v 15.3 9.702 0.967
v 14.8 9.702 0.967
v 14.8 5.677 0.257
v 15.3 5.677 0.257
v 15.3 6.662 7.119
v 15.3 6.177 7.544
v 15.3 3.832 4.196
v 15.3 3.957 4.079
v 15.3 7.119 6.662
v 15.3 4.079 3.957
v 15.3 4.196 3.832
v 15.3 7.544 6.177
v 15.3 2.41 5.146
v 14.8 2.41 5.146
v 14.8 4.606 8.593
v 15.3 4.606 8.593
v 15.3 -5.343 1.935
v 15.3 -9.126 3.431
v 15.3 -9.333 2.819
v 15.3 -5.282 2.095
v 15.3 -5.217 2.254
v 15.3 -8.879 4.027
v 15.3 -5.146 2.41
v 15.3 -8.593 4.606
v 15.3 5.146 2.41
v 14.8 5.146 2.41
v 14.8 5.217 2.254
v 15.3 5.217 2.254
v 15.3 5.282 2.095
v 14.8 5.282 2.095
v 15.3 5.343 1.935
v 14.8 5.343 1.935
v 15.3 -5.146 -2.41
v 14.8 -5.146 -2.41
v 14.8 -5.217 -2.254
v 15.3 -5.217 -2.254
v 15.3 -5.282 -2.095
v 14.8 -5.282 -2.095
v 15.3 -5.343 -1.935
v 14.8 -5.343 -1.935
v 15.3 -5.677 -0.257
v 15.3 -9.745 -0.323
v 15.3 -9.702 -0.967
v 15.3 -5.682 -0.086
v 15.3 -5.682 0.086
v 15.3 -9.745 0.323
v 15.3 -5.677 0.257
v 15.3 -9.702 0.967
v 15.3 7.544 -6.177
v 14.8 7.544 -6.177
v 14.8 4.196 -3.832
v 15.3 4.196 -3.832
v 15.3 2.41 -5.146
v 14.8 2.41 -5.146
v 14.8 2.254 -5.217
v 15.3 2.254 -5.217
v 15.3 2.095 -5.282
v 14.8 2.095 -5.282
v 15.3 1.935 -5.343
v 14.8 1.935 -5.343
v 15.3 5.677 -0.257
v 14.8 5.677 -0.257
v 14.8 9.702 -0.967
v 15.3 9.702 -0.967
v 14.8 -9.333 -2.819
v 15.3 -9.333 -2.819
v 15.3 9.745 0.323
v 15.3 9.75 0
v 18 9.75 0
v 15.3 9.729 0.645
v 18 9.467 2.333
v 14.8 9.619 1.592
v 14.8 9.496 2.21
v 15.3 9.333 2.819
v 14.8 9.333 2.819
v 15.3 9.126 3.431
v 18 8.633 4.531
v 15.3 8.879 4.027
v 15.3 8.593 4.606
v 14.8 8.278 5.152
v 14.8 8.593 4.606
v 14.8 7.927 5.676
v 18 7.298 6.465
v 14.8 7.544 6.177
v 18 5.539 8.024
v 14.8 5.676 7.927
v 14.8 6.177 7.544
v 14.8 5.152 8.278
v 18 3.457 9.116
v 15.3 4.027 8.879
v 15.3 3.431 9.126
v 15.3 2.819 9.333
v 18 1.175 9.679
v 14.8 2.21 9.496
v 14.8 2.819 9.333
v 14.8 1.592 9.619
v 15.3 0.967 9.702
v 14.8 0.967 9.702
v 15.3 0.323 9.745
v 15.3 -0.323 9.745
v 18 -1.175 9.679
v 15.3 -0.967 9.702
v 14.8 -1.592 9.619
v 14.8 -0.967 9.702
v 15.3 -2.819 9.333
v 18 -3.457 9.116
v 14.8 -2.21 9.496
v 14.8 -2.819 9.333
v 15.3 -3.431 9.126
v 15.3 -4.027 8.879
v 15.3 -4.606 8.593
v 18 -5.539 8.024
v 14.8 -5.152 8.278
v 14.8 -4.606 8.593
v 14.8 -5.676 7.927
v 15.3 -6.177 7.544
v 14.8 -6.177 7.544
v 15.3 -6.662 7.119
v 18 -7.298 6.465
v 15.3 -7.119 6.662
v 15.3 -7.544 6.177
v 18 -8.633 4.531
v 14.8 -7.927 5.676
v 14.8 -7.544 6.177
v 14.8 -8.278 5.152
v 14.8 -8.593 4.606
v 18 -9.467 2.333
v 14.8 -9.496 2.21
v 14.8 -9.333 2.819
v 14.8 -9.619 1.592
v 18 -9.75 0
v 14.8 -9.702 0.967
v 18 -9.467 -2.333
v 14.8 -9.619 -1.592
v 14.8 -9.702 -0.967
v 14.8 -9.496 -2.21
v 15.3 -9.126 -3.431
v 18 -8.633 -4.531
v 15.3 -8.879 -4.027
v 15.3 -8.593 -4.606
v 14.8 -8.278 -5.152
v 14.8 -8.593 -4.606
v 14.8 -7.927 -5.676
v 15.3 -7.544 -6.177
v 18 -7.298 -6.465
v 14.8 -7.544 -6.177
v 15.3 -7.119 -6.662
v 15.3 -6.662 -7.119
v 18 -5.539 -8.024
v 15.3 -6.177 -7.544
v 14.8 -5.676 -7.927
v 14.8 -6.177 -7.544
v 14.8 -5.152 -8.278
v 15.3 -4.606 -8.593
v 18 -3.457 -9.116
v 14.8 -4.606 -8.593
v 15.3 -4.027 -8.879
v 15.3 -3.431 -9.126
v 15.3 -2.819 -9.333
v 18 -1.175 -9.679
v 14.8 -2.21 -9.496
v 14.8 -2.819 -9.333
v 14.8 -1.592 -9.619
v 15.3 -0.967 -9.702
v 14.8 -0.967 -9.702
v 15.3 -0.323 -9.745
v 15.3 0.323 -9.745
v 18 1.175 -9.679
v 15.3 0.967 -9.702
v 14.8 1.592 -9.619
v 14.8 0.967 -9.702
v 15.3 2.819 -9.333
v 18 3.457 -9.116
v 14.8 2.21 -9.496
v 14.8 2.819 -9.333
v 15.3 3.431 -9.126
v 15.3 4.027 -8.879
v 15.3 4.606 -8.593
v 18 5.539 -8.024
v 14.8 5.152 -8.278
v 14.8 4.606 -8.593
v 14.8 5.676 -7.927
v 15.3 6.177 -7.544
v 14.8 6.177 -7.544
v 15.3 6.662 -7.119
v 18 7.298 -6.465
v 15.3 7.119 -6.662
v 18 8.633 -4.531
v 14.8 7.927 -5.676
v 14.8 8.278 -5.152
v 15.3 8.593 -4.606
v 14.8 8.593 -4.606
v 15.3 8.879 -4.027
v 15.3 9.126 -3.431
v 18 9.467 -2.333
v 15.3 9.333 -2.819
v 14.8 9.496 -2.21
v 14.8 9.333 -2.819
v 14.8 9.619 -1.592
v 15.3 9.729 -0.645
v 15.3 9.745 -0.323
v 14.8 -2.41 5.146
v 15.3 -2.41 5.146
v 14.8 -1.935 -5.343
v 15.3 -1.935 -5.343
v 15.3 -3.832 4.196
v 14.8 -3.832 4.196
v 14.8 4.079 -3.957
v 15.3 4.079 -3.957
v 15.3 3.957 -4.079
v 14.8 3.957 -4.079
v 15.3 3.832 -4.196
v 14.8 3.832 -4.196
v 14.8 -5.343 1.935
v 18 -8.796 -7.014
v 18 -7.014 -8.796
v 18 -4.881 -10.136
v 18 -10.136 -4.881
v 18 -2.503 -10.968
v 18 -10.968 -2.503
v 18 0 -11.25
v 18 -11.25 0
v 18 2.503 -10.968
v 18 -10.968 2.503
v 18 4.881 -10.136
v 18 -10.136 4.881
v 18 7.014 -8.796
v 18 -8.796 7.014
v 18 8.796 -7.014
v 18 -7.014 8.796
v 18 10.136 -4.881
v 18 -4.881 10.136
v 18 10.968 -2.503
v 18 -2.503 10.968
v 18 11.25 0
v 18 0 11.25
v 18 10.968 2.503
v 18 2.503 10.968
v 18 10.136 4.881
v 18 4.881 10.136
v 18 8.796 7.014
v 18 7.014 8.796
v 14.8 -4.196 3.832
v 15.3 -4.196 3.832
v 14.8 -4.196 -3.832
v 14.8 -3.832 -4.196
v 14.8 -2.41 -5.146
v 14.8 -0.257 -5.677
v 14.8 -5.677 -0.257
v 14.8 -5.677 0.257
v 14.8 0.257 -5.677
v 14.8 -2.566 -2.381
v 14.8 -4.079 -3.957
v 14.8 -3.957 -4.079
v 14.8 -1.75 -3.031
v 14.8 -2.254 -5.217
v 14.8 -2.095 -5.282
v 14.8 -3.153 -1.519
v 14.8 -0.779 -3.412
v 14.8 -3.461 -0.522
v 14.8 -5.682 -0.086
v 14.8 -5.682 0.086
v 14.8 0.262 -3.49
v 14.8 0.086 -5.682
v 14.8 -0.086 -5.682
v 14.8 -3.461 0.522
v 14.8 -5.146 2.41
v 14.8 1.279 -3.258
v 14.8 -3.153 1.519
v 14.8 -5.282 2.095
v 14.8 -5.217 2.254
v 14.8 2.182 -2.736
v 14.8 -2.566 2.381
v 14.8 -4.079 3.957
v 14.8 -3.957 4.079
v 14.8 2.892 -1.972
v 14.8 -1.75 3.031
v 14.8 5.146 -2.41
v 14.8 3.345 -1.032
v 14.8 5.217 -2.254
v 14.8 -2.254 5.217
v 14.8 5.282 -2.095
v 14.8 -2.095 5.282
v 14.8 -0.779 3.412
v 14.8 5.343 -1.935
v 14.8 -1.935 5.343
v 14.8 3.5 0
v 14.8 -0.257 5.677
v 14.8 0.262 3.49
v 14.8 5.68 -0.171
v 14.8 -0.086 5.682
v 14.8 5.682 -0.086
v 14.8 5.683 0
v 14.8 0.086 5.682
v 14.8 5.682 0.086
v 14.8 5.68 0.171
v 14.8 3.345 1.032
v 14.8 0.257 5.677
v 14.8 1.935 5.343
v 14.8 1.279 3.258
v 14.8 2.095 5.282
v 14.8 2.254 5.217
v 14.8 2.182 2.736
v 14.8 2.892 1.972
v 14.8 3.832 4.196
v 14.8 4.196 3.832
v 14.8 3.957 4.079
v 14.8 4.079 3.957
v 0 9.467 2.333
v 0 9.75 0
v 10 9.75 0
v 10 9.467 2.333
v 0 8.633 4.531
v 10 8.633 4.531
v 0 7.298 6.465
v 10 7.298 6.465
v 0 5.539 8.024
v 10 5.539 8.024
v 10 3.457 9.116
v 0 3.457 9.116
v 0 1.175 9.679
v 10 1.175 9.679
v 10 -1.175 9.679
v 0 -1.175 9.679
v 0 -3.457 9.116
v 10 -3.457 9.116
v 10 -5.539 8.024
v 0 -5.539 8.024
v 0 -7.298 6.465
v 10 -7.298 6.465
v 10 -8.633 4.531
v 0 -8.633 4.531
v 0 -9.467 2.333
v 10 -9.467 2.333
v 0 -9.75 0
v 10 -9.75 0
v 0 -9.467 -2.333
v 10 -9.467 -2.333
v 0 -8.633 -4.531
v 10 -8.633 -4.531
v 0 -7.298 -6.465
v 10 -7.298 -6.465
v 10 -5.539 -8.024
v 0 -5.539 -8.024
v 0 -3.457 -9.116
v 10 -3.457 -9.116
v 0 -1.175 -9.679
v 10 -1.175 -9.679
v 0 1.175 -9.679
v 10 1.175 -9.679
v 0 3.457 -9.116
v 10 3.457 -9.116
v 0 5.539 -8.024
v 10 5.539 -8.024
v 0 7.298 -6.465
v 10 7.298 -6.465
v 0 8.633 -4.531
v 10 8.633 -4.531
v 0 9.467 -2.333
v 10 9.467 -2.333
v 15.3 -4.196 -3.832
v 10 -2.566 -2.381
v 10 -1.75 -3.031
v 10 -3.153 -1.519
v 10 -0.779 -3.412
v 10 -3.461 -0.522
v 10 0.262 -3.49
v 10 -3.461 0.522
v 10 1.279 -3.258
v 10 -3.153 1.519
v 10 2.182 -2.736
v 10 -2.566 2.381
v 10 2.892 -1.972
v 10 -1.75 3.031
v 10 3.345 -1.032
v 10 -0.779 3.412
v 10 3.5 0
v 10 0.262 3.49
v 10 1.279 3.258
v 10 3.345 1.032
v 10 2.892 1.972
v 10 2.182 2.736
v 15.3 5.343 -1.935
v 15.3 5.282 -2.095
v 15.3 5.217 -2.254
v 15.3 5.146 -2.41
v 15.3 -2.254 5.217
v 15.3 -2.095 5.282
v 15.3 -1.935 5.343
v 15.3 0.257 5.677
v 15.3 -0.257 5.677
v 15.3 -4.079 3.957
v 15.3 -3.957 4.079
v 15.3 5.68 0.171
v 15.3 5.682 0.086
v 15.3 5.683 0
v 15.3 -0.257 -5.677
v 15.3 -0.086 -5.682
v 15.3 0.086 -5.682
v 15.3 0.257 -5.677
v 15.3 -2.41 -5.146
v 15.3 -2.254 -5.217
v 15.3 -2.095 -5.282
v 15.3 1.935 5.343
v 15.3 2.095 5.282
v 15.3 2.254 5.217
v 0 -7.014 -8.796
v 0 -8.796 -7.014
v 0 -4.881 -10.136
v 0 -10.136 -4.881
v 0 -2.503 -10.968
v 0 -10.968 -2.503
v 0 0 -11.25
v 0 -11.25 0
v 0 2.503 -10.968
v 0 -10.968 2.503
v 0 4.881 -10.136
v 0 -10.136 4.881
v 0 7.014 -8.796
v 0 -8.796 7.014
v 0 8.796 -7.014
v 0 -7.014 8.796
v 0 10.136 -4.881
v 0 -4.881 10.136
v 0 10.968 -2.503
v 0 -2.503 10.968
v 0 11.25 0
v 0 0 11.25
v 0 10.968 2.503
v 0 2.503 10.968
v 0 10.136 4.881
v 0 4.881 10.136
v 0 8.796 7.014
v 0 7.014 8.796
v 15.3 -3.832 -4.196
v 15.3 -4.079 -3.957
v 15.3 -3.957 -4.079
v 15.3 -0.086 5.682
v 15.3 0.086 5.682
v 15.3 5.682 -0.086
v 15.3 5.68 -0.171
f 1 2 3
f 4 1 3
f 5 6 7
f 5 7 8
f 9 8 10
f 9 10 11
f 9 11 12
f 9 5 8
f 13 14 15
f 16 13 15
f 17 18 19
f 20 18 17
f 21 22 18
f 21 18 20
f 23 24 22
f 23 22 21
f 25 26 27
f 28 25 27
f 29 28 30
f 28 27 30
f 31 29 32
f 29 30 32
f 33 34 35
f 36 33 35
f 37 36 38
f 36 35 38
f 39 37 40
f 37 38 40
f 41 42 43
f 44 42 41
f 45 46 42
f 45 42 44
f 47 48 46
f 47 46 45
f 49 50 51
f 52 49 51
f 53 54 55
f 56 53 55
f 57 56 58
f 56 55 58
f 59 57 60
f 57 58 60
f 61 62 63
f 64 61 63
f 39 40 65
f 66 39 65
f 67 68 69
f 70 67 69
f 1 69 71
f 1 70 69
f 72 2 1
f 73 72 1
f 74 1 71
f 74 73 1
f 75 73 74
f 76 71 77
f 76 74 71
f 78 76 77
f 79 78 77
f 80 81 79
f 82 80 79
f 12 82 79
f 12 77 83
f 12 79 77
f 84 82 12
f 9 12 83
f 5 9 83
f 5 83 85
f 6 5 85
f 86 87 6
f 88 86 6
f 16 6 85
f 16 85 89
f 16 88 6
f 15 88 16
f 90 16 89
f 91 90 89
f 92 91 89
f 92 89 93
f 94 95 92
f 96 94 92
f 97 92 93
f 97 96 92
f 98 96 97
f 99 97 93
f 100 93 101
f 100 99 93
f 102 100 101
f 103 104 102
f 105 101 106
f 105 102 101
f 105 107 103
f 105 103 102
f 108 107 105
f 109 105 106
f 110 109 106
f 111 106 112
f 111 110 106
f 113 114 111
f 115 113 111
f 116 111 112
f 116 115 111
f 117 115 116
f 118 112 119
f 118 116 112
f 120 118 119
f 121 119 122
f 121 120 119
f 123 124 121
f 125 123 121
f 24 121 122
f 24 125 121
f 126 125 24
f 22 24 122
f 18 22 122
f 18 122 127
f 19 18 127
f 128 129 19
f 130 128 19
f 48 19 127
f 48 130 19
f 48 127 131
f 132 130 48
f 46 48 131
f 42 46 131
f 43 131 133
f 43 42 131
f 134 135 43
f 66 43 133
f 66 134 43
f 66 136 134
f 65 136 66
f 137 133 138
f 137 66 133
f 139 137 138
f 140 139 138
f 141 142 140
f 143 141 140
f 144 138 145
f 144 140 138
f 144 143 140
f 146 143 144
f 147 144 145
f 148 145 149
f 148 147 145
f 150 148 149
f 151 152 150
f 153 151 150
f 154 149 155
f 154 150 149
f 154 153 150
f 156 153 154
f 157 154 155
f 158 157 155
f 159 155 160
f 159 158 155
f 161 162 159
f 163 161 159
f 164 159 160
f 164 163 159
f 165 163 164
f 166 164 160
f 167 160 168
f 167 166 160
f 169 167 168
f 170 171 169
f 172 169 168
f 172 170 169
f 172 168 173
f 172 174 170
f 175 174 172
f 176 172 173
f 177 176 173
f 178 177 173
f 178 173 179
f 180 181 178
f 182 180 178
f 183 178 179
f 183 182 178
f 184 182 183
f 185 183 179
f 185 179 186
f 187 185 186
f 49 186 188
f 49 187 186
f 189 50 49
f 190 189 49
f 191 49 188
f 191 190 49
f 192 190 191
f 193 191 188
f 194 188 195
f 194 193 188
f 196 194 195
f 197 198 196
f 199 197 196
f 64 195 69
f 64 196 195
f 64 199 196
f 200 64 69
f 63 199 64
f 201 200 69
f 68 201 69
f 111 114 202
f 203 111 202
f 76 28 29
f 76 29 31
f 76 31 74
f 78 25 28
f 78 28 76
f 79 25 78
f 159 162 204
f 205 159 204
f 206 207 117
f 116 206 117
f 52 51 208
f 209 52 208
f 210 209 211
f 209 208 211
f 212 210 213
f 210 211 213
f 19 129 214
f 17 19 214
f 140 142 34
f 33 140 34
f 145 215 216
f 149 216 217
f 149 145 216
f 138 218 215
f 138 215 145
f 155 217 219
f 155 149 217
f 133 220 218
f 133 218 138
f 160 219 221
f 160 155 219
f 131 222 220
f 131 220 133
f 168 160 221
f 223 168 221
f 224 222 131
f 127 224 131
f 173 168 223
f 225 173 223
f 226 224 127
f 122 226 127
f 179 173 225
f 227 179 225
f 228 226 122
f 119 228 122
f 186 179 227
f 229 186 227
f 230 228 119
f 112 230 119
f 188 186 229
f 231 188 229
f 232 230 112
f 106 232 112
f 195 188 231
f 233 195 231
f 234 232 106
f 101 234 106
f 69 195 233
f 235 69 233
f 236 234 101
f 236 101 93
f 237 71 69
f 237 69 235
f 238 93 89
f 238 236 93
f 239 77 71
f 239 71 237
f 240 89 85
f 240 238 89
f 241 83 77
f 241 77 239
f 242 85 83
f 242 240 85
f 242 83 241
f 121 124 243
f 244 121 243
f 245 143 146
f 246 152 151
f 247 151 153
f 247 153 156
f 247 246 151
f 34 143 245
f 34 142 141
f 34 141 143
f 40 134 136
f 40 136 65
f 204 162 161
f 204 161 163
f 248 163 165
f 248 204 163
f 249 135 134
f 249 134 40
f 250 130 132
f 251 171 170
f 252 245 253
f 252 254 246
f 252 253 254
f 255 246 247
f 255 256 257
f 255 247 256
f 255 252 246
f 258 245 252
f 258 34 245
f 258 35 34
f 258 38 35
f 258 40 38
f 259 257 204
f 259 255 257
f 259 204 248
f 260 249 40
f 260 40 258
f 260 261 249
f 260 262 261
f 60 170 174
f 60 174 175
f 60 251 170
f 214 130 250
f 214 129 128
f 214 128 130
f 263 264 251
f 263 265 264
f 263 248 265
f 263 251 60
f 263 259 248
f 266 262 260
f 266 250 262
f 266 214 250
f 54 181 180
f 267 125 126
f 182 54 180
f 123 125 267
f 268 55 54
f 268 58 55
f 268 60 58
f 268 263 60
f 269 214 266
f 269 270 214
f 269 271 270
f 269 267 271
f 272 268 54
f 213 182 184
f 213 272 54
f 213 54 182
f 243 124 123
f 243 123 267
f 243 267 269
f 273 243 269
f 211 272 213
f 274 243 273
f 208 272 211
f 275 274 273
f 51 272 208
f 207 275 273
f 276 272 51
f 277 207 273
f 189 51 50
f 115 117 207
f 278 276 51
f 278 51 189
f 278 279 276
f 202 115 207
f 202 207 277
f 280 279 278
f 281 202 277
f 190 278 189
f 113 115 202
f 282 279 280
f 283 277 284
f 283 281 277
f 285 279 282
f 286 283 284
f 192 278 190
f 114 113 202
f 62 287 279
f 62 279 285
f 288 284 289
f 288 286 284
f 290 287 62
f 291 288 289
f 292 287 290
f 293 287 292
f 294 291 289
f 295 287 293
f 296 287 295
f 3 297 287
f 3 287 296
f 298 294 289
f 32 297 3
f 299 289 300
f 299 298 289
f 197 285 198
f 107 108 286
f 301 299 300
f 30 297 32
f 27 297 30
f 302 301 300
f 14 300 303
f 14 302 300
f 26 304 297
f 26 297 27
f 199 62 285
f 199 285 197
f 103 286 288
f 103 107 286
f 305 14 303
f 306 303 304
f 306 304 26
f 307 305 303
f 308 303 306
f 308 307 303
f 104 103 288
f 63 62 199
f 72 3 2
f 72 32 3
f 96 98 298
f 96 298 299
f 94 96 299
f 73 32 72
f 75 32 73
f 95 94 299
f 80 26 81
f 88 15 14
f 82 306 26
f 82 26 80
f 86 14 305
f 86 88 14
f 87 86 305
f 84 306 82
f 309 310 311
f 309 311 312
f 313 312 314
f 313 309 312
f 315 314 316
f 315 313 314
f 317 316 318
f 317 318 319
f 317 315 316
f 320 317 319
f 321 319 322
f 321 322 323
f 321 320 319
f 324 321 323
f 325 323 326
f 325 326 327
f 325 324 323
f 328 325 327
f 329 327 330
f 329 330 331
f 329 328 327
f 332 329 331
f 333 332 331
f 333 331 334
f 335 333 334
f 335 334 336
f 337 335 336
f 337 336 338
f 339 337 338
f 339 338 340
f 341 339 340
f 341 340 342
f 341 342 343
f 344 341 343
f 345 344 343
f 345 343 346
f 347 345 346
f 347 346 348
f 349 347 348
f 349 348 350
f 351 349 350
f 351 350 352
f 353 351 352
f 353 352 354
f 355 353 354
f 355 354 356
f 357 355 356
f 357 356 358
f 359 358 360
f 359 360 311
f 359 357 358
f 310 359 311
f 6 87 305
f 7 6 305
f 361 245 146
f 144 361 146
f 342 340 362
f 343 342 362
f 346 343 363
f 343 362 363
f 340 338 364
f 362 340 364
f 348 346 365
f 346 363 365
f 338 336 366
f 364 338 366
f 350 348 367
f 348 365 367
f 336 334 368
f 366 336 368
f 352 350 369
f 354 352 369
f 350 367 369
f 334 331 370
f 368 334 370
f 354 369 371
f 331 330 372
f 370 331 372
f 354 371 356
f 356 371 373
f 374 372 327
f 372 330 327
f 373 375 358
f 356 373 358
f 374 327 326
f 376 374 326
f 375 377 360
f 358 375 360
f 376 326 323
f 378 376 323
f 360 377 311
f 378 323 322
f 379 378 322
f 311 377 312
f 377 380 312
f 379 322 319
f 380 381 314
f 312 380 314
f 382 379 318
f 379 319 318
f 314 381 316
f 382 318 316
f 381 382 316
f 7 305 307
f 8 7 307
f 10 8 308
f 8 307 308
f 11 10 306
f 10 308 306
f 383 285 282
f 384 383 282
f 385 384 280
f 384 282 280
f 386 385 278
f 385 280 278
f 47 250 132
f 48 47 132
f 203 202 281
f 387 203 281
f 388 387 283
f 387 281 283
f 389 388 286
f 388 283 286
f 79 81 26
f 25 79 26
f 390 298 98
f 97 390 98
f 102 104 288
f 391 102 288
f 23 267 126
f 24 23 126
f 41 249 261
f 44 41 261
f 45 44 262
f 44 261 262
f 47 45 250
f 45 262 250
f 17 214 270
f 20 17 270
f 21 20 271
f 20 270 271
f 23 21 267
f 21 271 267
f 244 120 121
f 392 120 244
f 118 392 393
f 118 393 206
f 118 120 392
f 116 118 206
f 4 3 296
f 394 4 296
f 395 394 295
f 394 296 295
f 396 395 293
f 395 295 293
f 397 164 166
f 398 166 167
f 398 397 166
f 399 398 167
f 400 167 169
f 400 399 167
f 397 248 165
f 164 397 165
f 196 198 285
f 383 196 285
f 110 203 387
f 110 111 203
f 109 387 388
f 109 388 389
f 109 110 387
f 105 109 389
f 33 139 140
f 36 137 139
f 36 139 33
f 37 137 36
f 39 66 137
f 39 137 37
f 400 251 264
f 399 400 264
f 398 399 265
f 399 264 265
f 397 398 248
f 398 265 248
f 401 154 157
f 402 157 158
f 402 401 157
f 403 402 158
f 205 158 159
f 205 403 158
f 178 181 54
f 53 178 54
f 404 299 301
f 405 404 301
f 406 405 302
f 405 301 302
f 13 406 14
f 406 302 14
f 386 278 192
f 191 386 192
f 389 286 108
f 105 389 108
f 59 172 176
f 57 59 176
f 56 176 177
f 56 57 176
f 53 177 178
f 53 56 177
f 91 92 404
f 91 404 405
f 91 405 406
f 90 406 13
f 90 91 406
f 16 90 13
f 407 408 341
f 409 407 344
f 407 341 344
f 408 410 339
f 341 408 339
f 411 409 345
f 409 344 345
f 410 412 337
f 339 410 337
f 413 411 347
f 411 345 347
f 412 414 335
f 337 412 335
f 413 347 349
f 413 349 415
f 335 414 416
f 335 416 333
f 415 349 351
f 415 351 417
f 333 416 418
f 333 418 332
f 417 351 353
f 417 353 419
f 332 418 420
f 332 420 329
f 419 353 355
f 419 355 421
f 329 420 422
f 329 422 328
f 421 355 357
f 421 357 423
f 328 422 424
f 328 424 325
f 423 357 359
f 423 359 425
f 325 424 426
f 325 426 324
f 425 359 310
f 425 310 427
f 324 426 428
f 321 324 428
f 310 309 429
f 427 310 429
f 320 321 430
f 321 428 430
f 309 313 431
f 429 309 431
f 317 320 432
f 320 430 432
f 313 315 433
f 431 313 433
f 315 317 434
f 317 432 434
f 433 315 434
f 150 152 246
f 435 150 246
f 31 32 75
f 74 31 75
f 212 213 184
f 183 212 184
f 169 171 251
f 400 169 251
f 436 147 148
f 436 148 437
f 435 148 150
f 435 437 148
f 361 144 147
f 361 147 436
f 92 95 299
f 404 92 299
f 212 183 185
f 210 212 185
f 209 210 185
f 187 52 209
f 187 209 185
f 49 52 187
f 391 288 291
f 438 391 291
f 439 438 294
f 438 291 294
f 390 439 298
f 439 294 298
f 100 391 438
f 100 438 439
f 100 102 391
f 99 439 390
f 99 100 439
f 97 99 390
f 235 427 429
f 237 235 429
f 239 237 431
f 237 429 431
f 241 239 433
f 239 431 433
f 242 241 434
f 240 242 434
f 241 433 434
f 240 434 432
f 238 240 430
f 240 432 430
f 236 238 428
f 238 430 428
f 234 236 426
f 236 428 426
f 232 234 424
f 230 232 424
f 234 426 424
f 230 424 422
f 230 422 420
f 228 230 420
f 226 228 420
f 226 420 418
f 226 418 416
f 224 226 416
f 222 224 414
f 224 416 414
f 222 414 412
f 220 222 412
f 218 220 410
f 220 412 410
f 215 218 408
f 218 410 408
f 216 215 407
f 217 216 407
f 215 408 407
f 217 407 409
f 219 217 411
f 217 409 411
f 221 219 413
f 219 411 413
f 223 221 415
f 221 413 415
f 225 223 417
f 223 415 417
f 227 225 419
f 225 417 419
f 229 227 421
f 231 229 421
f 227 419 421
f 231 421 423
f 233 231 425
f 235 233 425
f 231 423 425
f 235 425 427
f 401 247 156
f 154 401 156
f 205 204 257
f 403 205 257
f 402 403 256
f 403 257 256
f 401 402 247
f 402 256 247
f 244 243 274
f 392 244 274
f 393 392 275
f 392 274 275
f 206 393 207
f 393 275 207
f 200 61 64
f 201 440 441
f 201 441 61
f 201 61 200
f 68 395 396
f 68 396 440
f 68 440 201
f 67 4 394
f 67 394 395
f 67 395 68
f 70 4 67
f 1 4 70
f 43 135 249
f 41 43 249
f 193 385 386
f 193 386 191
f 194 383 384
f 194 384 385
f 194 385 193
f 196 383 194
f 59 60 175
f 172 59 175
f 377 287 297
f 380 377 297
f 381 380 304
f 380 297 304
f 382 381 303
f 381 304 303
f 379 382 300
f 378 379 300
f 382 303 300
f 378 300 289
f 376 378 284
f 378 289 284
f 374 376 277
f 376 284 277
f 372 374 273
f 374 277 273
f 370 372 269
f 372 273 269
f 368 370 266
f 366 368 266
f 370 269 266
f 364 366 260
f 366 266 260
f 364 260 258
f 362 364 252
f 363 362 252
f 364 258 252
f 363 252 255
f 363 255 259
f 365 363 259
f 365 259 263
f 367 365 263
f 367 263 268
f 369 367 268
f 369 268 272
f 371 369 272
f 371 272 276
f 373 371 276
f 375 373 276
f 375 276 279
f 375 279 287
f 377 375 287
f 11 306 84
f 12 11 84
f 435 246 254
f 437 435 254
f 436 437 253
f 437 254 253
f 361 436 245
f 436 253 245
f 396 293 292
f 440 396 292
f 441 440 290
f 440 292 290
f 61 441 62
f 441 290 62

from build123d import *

# Parameters (mm, degrees)
F0_R     = 9.75
F2_DEPTH = 18
F1_R     = 11.25
F1_R_2   = 9.75
F3_DEPTH = 18
F4_DEPTH = 10
F5_DEPTH = 3.2
F6_R     = 3.5
F7_DEPTH = 14.801
F9_DEPTH = 0.5


with BuildPart() as f2:
    # F0 (on Right) → F2 (new body)
    with BuildSketch(Plane.YZ):
        Circle(F0_R)
    extrude(amount=F2_DEPTH)

    # F4 (cut): a face of the model
    f4_faces = [f2.faces().sort_by_distance(p)[0] for p in [
        (0, 0, 0),
    ]]
    extrude(f4_faces, amount=-F4_DEPTH, mode=Mode.SUBTRACT)

    # F5 (cut): a face of the model
    f5_faces = [f2.faces().sort_by_distance(p)[0] for p in [
        (18, 0, 0),
    ]]
    extrude(f5_faces, amount=-F5_DEPTH, mode=Mode.SUBTRACT)

    # F6 (on face) → F7 (cut, through all)
    with BuildSketch(Plane.YZ.offset(14.8)):
        Circle(F6_R)
    extrude(amount=-F7_DEPTH, mode=Mode.SUBTRACT)



with BuildPart() as f3:
    # F1 (on face) → F3 (new body)
    with BuildSketch(Plane.YZ):
        Circle(F1_R)
        Circle(F1_R_2, mode=Mode.SUBTRACT)
    extrude(amount=F3_DEPTH)


with BuildPart() as f2_1:
    add(f2.part)

    add(f3.part)  # F9 merges F3
    # F8 (on face) → F9 (join)
    with BuildSketch(Plane.YZ.offset(14.8)):
        with BuildLine():
            ThreePointArc((-4.19606186, 3.8323562574), (-4.0183261202, 4.0183261202), (-3.8323562574, 4.19606186))
            Line((-3.8323562574, 4.19606186), (-6.1766101499, 7.5440033839))
            ThreePointArc((-6.1766101499, 7.5440033839), (-6.8942911166, 6.8942911166), (-7.5440033839, 6.1766101499))
            Line((-7.5440033839, 6.1766101499), (-4.19606186, 3.8323562574))
        make_face()
        with BuildLine():
            ThreePointArc((-2.410076423, 5.1463988625), (-2.1747024254, 5.2501960894), (-1.9348721525, 5.3432349162))
            Line((-1.9348721525, 5.3432349162), (-2.8194785891, 9.3334366921))
            ThreePointArc((-2.8194785891, 9.3334366921), (-3.7311634656, 9.007825442), (-4.606063947, 8.5934088065))
            Line((-4.606063947, 8.5934088065), (-2.410076423, 5.1463988625))
        make_face()
        with BuildLine():
            ThreePointArc((-0.2571786979, 5.676948893), (0, 5.6827712972), (0.2571786979, 5.676948893))
            Line((0.2571786979, 5.676948893), (0.9668930283, 9.7019388718))
            ThreePointArc((0.9668930283, 9.7019388718), (0, 9.75), (-0.9668930283, 9.7019388718))
            Line((-0.9668930283, 9.7019388718), (-0.2571786979, 5.676948893))
        make_face()
        with BuildLine():
            Line((2.8194785891, 9.3334366921), (1.9348721525, 5.3432349162))
            ThreePointArc((1.9348721525, 5.3432349162), (2.1747024254, 5.2501960894), (2.410076423, 5.1463988625))
            Line((2.410076423, 5.1463988625), (4.606063947, 8.5934088065))
            ThreePointArc((4.606063947, 8.5934088065), (3.7311634656, 9.007825442), (2.8194785891, 9.3334366921))
        make_face()
        with BuildLine():
            Line((6.1766101499, 7.5440033839), (3.8323562574, 4.19606186))
            ThreePointArc((3.8323562574, 4.19606186), (4.0183261202, 4.0183261202), (4.19606186, 3.8323562574))
            Line((4.19606186, 3.8323562574), (7.5440033839, 6.1766101499))
            ThreePointArc((7.5440033839, 6.1766101499), (6.8942911166, 6.8942911166), (6.1766101499, 7.5440033839))
        make_face()
        with BuildLine():
            Line((8.5934088065, 4.606063947), (5.1463988625, 2.410076423))
            ThreePointArc((5.1463988625, 2.410076423), (5.2501960894, 2.1747024254), (5.3432349162, 1.9348721525))
            Line((5.3432349162, 1.9348721525), (9.3334366921, 2.8194785891))
            ThreePointArc((9.3334366921, 2.8194785891), (9.007825442, 3.7311634656), (8.5934088065, 4.606063947))
        make_face()
        with BuildLine():
            Line((9.7019388718, 0.9668930283), (5.676948893, 0.2571786979))
            ThreePointArc((5.676948893, 0.2571786979), (5.6813155097, 0.1286222989), (5.6827712972, 0))
            ThreePointArc((5.6827712972, 0), (5.6813155097, -0.1286222989), (5.676948893, -0.2571786979))
            Line((5.676948893, -0.2571786979), (9.7019388718, -0.9668930283))
            ThreePointArc((9.7019388718, -0.9668930283), (9.7379773054, -0.4840433865), (9.75, 0))
            ThreePointArc((9.75, 0), (9.7379773054, 0.4840433865), (9.7019388718, 0.9668930283))
        make_face()
        with BuildLine():
            Line((9.3334366921, -2.8194785891), (5.3432349162, -1.9348721525))
            ThreePointArc((5.3432349162, -1.9348721525), (5.2501960894, -2.1747024254), (5.1463988625, -2.410076423))
            Line((5.1463988625, -2.410076423), (8.5934088065, -4.606063947))
            ThreePointArc((8.5934088065, -4.606063947), (9.007825442, -3.7311634656), (9.3334366921, -2.8194785891))
        make_face()
        with BuildLine():
            Line((7.5440033839, -6.1766101499), (4.19606186, -3.8323562574))
            ThreePointArc((4.19606186, -3.8323562574), (4.0183261202, -4.0183261202), (3.8323562574, -4.19606186))
            Line((3.8323562574, -4.19606186), (6.1766101499, -7.5440033839))
            ThreePointArc((6.1766101499, -7.5440033839), (6.8942911166, -6.8942911166), (7.5440033839, -6.1766101499))
        make_face()
        with BuildLine():
            Line((4.606063947, -8.5934088065), (2.410076423, -5.1463988625))
            ThreePointArc((2.410076423, -5.1463988625), (2.1747024254, -5.2501960894), (1.9348721525, -5.3432349162))
            Line((1.9348721525, -5.3432349162), (2.8194785891, -9.3334366921))
            ThreePointArc((2.8194785891, -9.3334366921), (3.7311634656, -9.007825442), (4.606063947, -8.5934088065))
        make_face()
        with BuildLine():
            ThreePointArc((0.2571786979, -5.676948893), (0, -5.6827712972), (-0.2571786979, -5.676948893))
            Line((-0.2571786979, -5.676948893), (-0.9668930283, -9.7019388718))
            ThreePointArc((-0.9668930283, -9.7019388718), (0, -9.75), (0.9668930283, -9.7019388718))
            Line((0.9668930283, -9.7019388718), (0.2571786979, -5.676948893))
        make_face()
        with BuildLine():
            ThreePointArc((-1.9348721525, -5.3432349162), (-2.1747024254, -5.2501960894), (-2.410076423, -5.1463988625))
            Line((-2.410076423, -5.1463988625), (-4.606063947, -8.5934088065))
            ThreePointArc((-4.606063947, -8.5934088065), (-3.7311634656, -9.007825442), (-2.8194785891, -9.3334366921))
            Line((-2.8194785891, -9.3334366921), (-1.9348721525, -5.3432349162))
        make_face()
        with BuildLine():
            ThreePointArc((-3.8323562574, -4.19606186), (-4.0183261202, -4.0183261202), (-4.19606186, -3.8323562574))
            Line((-4.19606186, -3.8323562574), (-7.5440033839, -6.1766101499))
            ThreePointArc((-7.5440033839, -6.1766101499), (-6.8942911166, -6.8942911166), (-6.1766101499, -7.5440033839))
            Line((-6.1766101499, -7.5440033839), (-3.8323562574, -4.19606186))
        make_face()
        with BuildLine():
            ThreePointArc((-5.1463988625, -2.410076423), (-5.2501960894, -2.1747024254), (-5.3432349162, -1.9348721525))
            Line((-5.3432349162, -1.9348721525), (-9.3334366921, -2.8194785891))
            ThreePointArc((-9.3334366921, -2.8194785891), (-9.007825442, -3.7311634656), (-8.5934088065, -4.606063947))
            Line((-8.5934088065, -4.606063947), (-5.1463988625, -2.410076423))
        make_face()
        with BuildLine():
            ThreePointArc((-5.676948893, -0.2571786979), (-5.6827712972, 0), (-5.676948893, 0.2571786979))
            Line((-5.676948893, 0.2571786979), (-9.7019388718, 0.9668930283))
            ThreePointArc((-9.7019388718, 0.9668930283), (-9.75, 0), (-9.7019388718, -0.9668930283))
            Line((-9.7019388718, -0.9668930283), (-5.676948893, -0.2571786979))
        make_face()
        with BuildLine():
            ThreePointArc((-5.3432349162, 1.9348721525), (-5.2501960894, 2.1747024254), (-5.1463988625, 2.410076423))
            Line((-5.1463988625, 2.410076423), (-8.5934088065, 4.606063947))
            ThreePointArc((-8.5934088065, 4.606063947), (-9.007825442, 3.7311634656), (-9.3334366921, 2.8194785891))
            Line((-9.3334366921, 2.8194785891), (-5.3432349162, 1.9348721525))
        make_face()
    extrude(amount=F9_DEPTH)


solid = f2_1.part
